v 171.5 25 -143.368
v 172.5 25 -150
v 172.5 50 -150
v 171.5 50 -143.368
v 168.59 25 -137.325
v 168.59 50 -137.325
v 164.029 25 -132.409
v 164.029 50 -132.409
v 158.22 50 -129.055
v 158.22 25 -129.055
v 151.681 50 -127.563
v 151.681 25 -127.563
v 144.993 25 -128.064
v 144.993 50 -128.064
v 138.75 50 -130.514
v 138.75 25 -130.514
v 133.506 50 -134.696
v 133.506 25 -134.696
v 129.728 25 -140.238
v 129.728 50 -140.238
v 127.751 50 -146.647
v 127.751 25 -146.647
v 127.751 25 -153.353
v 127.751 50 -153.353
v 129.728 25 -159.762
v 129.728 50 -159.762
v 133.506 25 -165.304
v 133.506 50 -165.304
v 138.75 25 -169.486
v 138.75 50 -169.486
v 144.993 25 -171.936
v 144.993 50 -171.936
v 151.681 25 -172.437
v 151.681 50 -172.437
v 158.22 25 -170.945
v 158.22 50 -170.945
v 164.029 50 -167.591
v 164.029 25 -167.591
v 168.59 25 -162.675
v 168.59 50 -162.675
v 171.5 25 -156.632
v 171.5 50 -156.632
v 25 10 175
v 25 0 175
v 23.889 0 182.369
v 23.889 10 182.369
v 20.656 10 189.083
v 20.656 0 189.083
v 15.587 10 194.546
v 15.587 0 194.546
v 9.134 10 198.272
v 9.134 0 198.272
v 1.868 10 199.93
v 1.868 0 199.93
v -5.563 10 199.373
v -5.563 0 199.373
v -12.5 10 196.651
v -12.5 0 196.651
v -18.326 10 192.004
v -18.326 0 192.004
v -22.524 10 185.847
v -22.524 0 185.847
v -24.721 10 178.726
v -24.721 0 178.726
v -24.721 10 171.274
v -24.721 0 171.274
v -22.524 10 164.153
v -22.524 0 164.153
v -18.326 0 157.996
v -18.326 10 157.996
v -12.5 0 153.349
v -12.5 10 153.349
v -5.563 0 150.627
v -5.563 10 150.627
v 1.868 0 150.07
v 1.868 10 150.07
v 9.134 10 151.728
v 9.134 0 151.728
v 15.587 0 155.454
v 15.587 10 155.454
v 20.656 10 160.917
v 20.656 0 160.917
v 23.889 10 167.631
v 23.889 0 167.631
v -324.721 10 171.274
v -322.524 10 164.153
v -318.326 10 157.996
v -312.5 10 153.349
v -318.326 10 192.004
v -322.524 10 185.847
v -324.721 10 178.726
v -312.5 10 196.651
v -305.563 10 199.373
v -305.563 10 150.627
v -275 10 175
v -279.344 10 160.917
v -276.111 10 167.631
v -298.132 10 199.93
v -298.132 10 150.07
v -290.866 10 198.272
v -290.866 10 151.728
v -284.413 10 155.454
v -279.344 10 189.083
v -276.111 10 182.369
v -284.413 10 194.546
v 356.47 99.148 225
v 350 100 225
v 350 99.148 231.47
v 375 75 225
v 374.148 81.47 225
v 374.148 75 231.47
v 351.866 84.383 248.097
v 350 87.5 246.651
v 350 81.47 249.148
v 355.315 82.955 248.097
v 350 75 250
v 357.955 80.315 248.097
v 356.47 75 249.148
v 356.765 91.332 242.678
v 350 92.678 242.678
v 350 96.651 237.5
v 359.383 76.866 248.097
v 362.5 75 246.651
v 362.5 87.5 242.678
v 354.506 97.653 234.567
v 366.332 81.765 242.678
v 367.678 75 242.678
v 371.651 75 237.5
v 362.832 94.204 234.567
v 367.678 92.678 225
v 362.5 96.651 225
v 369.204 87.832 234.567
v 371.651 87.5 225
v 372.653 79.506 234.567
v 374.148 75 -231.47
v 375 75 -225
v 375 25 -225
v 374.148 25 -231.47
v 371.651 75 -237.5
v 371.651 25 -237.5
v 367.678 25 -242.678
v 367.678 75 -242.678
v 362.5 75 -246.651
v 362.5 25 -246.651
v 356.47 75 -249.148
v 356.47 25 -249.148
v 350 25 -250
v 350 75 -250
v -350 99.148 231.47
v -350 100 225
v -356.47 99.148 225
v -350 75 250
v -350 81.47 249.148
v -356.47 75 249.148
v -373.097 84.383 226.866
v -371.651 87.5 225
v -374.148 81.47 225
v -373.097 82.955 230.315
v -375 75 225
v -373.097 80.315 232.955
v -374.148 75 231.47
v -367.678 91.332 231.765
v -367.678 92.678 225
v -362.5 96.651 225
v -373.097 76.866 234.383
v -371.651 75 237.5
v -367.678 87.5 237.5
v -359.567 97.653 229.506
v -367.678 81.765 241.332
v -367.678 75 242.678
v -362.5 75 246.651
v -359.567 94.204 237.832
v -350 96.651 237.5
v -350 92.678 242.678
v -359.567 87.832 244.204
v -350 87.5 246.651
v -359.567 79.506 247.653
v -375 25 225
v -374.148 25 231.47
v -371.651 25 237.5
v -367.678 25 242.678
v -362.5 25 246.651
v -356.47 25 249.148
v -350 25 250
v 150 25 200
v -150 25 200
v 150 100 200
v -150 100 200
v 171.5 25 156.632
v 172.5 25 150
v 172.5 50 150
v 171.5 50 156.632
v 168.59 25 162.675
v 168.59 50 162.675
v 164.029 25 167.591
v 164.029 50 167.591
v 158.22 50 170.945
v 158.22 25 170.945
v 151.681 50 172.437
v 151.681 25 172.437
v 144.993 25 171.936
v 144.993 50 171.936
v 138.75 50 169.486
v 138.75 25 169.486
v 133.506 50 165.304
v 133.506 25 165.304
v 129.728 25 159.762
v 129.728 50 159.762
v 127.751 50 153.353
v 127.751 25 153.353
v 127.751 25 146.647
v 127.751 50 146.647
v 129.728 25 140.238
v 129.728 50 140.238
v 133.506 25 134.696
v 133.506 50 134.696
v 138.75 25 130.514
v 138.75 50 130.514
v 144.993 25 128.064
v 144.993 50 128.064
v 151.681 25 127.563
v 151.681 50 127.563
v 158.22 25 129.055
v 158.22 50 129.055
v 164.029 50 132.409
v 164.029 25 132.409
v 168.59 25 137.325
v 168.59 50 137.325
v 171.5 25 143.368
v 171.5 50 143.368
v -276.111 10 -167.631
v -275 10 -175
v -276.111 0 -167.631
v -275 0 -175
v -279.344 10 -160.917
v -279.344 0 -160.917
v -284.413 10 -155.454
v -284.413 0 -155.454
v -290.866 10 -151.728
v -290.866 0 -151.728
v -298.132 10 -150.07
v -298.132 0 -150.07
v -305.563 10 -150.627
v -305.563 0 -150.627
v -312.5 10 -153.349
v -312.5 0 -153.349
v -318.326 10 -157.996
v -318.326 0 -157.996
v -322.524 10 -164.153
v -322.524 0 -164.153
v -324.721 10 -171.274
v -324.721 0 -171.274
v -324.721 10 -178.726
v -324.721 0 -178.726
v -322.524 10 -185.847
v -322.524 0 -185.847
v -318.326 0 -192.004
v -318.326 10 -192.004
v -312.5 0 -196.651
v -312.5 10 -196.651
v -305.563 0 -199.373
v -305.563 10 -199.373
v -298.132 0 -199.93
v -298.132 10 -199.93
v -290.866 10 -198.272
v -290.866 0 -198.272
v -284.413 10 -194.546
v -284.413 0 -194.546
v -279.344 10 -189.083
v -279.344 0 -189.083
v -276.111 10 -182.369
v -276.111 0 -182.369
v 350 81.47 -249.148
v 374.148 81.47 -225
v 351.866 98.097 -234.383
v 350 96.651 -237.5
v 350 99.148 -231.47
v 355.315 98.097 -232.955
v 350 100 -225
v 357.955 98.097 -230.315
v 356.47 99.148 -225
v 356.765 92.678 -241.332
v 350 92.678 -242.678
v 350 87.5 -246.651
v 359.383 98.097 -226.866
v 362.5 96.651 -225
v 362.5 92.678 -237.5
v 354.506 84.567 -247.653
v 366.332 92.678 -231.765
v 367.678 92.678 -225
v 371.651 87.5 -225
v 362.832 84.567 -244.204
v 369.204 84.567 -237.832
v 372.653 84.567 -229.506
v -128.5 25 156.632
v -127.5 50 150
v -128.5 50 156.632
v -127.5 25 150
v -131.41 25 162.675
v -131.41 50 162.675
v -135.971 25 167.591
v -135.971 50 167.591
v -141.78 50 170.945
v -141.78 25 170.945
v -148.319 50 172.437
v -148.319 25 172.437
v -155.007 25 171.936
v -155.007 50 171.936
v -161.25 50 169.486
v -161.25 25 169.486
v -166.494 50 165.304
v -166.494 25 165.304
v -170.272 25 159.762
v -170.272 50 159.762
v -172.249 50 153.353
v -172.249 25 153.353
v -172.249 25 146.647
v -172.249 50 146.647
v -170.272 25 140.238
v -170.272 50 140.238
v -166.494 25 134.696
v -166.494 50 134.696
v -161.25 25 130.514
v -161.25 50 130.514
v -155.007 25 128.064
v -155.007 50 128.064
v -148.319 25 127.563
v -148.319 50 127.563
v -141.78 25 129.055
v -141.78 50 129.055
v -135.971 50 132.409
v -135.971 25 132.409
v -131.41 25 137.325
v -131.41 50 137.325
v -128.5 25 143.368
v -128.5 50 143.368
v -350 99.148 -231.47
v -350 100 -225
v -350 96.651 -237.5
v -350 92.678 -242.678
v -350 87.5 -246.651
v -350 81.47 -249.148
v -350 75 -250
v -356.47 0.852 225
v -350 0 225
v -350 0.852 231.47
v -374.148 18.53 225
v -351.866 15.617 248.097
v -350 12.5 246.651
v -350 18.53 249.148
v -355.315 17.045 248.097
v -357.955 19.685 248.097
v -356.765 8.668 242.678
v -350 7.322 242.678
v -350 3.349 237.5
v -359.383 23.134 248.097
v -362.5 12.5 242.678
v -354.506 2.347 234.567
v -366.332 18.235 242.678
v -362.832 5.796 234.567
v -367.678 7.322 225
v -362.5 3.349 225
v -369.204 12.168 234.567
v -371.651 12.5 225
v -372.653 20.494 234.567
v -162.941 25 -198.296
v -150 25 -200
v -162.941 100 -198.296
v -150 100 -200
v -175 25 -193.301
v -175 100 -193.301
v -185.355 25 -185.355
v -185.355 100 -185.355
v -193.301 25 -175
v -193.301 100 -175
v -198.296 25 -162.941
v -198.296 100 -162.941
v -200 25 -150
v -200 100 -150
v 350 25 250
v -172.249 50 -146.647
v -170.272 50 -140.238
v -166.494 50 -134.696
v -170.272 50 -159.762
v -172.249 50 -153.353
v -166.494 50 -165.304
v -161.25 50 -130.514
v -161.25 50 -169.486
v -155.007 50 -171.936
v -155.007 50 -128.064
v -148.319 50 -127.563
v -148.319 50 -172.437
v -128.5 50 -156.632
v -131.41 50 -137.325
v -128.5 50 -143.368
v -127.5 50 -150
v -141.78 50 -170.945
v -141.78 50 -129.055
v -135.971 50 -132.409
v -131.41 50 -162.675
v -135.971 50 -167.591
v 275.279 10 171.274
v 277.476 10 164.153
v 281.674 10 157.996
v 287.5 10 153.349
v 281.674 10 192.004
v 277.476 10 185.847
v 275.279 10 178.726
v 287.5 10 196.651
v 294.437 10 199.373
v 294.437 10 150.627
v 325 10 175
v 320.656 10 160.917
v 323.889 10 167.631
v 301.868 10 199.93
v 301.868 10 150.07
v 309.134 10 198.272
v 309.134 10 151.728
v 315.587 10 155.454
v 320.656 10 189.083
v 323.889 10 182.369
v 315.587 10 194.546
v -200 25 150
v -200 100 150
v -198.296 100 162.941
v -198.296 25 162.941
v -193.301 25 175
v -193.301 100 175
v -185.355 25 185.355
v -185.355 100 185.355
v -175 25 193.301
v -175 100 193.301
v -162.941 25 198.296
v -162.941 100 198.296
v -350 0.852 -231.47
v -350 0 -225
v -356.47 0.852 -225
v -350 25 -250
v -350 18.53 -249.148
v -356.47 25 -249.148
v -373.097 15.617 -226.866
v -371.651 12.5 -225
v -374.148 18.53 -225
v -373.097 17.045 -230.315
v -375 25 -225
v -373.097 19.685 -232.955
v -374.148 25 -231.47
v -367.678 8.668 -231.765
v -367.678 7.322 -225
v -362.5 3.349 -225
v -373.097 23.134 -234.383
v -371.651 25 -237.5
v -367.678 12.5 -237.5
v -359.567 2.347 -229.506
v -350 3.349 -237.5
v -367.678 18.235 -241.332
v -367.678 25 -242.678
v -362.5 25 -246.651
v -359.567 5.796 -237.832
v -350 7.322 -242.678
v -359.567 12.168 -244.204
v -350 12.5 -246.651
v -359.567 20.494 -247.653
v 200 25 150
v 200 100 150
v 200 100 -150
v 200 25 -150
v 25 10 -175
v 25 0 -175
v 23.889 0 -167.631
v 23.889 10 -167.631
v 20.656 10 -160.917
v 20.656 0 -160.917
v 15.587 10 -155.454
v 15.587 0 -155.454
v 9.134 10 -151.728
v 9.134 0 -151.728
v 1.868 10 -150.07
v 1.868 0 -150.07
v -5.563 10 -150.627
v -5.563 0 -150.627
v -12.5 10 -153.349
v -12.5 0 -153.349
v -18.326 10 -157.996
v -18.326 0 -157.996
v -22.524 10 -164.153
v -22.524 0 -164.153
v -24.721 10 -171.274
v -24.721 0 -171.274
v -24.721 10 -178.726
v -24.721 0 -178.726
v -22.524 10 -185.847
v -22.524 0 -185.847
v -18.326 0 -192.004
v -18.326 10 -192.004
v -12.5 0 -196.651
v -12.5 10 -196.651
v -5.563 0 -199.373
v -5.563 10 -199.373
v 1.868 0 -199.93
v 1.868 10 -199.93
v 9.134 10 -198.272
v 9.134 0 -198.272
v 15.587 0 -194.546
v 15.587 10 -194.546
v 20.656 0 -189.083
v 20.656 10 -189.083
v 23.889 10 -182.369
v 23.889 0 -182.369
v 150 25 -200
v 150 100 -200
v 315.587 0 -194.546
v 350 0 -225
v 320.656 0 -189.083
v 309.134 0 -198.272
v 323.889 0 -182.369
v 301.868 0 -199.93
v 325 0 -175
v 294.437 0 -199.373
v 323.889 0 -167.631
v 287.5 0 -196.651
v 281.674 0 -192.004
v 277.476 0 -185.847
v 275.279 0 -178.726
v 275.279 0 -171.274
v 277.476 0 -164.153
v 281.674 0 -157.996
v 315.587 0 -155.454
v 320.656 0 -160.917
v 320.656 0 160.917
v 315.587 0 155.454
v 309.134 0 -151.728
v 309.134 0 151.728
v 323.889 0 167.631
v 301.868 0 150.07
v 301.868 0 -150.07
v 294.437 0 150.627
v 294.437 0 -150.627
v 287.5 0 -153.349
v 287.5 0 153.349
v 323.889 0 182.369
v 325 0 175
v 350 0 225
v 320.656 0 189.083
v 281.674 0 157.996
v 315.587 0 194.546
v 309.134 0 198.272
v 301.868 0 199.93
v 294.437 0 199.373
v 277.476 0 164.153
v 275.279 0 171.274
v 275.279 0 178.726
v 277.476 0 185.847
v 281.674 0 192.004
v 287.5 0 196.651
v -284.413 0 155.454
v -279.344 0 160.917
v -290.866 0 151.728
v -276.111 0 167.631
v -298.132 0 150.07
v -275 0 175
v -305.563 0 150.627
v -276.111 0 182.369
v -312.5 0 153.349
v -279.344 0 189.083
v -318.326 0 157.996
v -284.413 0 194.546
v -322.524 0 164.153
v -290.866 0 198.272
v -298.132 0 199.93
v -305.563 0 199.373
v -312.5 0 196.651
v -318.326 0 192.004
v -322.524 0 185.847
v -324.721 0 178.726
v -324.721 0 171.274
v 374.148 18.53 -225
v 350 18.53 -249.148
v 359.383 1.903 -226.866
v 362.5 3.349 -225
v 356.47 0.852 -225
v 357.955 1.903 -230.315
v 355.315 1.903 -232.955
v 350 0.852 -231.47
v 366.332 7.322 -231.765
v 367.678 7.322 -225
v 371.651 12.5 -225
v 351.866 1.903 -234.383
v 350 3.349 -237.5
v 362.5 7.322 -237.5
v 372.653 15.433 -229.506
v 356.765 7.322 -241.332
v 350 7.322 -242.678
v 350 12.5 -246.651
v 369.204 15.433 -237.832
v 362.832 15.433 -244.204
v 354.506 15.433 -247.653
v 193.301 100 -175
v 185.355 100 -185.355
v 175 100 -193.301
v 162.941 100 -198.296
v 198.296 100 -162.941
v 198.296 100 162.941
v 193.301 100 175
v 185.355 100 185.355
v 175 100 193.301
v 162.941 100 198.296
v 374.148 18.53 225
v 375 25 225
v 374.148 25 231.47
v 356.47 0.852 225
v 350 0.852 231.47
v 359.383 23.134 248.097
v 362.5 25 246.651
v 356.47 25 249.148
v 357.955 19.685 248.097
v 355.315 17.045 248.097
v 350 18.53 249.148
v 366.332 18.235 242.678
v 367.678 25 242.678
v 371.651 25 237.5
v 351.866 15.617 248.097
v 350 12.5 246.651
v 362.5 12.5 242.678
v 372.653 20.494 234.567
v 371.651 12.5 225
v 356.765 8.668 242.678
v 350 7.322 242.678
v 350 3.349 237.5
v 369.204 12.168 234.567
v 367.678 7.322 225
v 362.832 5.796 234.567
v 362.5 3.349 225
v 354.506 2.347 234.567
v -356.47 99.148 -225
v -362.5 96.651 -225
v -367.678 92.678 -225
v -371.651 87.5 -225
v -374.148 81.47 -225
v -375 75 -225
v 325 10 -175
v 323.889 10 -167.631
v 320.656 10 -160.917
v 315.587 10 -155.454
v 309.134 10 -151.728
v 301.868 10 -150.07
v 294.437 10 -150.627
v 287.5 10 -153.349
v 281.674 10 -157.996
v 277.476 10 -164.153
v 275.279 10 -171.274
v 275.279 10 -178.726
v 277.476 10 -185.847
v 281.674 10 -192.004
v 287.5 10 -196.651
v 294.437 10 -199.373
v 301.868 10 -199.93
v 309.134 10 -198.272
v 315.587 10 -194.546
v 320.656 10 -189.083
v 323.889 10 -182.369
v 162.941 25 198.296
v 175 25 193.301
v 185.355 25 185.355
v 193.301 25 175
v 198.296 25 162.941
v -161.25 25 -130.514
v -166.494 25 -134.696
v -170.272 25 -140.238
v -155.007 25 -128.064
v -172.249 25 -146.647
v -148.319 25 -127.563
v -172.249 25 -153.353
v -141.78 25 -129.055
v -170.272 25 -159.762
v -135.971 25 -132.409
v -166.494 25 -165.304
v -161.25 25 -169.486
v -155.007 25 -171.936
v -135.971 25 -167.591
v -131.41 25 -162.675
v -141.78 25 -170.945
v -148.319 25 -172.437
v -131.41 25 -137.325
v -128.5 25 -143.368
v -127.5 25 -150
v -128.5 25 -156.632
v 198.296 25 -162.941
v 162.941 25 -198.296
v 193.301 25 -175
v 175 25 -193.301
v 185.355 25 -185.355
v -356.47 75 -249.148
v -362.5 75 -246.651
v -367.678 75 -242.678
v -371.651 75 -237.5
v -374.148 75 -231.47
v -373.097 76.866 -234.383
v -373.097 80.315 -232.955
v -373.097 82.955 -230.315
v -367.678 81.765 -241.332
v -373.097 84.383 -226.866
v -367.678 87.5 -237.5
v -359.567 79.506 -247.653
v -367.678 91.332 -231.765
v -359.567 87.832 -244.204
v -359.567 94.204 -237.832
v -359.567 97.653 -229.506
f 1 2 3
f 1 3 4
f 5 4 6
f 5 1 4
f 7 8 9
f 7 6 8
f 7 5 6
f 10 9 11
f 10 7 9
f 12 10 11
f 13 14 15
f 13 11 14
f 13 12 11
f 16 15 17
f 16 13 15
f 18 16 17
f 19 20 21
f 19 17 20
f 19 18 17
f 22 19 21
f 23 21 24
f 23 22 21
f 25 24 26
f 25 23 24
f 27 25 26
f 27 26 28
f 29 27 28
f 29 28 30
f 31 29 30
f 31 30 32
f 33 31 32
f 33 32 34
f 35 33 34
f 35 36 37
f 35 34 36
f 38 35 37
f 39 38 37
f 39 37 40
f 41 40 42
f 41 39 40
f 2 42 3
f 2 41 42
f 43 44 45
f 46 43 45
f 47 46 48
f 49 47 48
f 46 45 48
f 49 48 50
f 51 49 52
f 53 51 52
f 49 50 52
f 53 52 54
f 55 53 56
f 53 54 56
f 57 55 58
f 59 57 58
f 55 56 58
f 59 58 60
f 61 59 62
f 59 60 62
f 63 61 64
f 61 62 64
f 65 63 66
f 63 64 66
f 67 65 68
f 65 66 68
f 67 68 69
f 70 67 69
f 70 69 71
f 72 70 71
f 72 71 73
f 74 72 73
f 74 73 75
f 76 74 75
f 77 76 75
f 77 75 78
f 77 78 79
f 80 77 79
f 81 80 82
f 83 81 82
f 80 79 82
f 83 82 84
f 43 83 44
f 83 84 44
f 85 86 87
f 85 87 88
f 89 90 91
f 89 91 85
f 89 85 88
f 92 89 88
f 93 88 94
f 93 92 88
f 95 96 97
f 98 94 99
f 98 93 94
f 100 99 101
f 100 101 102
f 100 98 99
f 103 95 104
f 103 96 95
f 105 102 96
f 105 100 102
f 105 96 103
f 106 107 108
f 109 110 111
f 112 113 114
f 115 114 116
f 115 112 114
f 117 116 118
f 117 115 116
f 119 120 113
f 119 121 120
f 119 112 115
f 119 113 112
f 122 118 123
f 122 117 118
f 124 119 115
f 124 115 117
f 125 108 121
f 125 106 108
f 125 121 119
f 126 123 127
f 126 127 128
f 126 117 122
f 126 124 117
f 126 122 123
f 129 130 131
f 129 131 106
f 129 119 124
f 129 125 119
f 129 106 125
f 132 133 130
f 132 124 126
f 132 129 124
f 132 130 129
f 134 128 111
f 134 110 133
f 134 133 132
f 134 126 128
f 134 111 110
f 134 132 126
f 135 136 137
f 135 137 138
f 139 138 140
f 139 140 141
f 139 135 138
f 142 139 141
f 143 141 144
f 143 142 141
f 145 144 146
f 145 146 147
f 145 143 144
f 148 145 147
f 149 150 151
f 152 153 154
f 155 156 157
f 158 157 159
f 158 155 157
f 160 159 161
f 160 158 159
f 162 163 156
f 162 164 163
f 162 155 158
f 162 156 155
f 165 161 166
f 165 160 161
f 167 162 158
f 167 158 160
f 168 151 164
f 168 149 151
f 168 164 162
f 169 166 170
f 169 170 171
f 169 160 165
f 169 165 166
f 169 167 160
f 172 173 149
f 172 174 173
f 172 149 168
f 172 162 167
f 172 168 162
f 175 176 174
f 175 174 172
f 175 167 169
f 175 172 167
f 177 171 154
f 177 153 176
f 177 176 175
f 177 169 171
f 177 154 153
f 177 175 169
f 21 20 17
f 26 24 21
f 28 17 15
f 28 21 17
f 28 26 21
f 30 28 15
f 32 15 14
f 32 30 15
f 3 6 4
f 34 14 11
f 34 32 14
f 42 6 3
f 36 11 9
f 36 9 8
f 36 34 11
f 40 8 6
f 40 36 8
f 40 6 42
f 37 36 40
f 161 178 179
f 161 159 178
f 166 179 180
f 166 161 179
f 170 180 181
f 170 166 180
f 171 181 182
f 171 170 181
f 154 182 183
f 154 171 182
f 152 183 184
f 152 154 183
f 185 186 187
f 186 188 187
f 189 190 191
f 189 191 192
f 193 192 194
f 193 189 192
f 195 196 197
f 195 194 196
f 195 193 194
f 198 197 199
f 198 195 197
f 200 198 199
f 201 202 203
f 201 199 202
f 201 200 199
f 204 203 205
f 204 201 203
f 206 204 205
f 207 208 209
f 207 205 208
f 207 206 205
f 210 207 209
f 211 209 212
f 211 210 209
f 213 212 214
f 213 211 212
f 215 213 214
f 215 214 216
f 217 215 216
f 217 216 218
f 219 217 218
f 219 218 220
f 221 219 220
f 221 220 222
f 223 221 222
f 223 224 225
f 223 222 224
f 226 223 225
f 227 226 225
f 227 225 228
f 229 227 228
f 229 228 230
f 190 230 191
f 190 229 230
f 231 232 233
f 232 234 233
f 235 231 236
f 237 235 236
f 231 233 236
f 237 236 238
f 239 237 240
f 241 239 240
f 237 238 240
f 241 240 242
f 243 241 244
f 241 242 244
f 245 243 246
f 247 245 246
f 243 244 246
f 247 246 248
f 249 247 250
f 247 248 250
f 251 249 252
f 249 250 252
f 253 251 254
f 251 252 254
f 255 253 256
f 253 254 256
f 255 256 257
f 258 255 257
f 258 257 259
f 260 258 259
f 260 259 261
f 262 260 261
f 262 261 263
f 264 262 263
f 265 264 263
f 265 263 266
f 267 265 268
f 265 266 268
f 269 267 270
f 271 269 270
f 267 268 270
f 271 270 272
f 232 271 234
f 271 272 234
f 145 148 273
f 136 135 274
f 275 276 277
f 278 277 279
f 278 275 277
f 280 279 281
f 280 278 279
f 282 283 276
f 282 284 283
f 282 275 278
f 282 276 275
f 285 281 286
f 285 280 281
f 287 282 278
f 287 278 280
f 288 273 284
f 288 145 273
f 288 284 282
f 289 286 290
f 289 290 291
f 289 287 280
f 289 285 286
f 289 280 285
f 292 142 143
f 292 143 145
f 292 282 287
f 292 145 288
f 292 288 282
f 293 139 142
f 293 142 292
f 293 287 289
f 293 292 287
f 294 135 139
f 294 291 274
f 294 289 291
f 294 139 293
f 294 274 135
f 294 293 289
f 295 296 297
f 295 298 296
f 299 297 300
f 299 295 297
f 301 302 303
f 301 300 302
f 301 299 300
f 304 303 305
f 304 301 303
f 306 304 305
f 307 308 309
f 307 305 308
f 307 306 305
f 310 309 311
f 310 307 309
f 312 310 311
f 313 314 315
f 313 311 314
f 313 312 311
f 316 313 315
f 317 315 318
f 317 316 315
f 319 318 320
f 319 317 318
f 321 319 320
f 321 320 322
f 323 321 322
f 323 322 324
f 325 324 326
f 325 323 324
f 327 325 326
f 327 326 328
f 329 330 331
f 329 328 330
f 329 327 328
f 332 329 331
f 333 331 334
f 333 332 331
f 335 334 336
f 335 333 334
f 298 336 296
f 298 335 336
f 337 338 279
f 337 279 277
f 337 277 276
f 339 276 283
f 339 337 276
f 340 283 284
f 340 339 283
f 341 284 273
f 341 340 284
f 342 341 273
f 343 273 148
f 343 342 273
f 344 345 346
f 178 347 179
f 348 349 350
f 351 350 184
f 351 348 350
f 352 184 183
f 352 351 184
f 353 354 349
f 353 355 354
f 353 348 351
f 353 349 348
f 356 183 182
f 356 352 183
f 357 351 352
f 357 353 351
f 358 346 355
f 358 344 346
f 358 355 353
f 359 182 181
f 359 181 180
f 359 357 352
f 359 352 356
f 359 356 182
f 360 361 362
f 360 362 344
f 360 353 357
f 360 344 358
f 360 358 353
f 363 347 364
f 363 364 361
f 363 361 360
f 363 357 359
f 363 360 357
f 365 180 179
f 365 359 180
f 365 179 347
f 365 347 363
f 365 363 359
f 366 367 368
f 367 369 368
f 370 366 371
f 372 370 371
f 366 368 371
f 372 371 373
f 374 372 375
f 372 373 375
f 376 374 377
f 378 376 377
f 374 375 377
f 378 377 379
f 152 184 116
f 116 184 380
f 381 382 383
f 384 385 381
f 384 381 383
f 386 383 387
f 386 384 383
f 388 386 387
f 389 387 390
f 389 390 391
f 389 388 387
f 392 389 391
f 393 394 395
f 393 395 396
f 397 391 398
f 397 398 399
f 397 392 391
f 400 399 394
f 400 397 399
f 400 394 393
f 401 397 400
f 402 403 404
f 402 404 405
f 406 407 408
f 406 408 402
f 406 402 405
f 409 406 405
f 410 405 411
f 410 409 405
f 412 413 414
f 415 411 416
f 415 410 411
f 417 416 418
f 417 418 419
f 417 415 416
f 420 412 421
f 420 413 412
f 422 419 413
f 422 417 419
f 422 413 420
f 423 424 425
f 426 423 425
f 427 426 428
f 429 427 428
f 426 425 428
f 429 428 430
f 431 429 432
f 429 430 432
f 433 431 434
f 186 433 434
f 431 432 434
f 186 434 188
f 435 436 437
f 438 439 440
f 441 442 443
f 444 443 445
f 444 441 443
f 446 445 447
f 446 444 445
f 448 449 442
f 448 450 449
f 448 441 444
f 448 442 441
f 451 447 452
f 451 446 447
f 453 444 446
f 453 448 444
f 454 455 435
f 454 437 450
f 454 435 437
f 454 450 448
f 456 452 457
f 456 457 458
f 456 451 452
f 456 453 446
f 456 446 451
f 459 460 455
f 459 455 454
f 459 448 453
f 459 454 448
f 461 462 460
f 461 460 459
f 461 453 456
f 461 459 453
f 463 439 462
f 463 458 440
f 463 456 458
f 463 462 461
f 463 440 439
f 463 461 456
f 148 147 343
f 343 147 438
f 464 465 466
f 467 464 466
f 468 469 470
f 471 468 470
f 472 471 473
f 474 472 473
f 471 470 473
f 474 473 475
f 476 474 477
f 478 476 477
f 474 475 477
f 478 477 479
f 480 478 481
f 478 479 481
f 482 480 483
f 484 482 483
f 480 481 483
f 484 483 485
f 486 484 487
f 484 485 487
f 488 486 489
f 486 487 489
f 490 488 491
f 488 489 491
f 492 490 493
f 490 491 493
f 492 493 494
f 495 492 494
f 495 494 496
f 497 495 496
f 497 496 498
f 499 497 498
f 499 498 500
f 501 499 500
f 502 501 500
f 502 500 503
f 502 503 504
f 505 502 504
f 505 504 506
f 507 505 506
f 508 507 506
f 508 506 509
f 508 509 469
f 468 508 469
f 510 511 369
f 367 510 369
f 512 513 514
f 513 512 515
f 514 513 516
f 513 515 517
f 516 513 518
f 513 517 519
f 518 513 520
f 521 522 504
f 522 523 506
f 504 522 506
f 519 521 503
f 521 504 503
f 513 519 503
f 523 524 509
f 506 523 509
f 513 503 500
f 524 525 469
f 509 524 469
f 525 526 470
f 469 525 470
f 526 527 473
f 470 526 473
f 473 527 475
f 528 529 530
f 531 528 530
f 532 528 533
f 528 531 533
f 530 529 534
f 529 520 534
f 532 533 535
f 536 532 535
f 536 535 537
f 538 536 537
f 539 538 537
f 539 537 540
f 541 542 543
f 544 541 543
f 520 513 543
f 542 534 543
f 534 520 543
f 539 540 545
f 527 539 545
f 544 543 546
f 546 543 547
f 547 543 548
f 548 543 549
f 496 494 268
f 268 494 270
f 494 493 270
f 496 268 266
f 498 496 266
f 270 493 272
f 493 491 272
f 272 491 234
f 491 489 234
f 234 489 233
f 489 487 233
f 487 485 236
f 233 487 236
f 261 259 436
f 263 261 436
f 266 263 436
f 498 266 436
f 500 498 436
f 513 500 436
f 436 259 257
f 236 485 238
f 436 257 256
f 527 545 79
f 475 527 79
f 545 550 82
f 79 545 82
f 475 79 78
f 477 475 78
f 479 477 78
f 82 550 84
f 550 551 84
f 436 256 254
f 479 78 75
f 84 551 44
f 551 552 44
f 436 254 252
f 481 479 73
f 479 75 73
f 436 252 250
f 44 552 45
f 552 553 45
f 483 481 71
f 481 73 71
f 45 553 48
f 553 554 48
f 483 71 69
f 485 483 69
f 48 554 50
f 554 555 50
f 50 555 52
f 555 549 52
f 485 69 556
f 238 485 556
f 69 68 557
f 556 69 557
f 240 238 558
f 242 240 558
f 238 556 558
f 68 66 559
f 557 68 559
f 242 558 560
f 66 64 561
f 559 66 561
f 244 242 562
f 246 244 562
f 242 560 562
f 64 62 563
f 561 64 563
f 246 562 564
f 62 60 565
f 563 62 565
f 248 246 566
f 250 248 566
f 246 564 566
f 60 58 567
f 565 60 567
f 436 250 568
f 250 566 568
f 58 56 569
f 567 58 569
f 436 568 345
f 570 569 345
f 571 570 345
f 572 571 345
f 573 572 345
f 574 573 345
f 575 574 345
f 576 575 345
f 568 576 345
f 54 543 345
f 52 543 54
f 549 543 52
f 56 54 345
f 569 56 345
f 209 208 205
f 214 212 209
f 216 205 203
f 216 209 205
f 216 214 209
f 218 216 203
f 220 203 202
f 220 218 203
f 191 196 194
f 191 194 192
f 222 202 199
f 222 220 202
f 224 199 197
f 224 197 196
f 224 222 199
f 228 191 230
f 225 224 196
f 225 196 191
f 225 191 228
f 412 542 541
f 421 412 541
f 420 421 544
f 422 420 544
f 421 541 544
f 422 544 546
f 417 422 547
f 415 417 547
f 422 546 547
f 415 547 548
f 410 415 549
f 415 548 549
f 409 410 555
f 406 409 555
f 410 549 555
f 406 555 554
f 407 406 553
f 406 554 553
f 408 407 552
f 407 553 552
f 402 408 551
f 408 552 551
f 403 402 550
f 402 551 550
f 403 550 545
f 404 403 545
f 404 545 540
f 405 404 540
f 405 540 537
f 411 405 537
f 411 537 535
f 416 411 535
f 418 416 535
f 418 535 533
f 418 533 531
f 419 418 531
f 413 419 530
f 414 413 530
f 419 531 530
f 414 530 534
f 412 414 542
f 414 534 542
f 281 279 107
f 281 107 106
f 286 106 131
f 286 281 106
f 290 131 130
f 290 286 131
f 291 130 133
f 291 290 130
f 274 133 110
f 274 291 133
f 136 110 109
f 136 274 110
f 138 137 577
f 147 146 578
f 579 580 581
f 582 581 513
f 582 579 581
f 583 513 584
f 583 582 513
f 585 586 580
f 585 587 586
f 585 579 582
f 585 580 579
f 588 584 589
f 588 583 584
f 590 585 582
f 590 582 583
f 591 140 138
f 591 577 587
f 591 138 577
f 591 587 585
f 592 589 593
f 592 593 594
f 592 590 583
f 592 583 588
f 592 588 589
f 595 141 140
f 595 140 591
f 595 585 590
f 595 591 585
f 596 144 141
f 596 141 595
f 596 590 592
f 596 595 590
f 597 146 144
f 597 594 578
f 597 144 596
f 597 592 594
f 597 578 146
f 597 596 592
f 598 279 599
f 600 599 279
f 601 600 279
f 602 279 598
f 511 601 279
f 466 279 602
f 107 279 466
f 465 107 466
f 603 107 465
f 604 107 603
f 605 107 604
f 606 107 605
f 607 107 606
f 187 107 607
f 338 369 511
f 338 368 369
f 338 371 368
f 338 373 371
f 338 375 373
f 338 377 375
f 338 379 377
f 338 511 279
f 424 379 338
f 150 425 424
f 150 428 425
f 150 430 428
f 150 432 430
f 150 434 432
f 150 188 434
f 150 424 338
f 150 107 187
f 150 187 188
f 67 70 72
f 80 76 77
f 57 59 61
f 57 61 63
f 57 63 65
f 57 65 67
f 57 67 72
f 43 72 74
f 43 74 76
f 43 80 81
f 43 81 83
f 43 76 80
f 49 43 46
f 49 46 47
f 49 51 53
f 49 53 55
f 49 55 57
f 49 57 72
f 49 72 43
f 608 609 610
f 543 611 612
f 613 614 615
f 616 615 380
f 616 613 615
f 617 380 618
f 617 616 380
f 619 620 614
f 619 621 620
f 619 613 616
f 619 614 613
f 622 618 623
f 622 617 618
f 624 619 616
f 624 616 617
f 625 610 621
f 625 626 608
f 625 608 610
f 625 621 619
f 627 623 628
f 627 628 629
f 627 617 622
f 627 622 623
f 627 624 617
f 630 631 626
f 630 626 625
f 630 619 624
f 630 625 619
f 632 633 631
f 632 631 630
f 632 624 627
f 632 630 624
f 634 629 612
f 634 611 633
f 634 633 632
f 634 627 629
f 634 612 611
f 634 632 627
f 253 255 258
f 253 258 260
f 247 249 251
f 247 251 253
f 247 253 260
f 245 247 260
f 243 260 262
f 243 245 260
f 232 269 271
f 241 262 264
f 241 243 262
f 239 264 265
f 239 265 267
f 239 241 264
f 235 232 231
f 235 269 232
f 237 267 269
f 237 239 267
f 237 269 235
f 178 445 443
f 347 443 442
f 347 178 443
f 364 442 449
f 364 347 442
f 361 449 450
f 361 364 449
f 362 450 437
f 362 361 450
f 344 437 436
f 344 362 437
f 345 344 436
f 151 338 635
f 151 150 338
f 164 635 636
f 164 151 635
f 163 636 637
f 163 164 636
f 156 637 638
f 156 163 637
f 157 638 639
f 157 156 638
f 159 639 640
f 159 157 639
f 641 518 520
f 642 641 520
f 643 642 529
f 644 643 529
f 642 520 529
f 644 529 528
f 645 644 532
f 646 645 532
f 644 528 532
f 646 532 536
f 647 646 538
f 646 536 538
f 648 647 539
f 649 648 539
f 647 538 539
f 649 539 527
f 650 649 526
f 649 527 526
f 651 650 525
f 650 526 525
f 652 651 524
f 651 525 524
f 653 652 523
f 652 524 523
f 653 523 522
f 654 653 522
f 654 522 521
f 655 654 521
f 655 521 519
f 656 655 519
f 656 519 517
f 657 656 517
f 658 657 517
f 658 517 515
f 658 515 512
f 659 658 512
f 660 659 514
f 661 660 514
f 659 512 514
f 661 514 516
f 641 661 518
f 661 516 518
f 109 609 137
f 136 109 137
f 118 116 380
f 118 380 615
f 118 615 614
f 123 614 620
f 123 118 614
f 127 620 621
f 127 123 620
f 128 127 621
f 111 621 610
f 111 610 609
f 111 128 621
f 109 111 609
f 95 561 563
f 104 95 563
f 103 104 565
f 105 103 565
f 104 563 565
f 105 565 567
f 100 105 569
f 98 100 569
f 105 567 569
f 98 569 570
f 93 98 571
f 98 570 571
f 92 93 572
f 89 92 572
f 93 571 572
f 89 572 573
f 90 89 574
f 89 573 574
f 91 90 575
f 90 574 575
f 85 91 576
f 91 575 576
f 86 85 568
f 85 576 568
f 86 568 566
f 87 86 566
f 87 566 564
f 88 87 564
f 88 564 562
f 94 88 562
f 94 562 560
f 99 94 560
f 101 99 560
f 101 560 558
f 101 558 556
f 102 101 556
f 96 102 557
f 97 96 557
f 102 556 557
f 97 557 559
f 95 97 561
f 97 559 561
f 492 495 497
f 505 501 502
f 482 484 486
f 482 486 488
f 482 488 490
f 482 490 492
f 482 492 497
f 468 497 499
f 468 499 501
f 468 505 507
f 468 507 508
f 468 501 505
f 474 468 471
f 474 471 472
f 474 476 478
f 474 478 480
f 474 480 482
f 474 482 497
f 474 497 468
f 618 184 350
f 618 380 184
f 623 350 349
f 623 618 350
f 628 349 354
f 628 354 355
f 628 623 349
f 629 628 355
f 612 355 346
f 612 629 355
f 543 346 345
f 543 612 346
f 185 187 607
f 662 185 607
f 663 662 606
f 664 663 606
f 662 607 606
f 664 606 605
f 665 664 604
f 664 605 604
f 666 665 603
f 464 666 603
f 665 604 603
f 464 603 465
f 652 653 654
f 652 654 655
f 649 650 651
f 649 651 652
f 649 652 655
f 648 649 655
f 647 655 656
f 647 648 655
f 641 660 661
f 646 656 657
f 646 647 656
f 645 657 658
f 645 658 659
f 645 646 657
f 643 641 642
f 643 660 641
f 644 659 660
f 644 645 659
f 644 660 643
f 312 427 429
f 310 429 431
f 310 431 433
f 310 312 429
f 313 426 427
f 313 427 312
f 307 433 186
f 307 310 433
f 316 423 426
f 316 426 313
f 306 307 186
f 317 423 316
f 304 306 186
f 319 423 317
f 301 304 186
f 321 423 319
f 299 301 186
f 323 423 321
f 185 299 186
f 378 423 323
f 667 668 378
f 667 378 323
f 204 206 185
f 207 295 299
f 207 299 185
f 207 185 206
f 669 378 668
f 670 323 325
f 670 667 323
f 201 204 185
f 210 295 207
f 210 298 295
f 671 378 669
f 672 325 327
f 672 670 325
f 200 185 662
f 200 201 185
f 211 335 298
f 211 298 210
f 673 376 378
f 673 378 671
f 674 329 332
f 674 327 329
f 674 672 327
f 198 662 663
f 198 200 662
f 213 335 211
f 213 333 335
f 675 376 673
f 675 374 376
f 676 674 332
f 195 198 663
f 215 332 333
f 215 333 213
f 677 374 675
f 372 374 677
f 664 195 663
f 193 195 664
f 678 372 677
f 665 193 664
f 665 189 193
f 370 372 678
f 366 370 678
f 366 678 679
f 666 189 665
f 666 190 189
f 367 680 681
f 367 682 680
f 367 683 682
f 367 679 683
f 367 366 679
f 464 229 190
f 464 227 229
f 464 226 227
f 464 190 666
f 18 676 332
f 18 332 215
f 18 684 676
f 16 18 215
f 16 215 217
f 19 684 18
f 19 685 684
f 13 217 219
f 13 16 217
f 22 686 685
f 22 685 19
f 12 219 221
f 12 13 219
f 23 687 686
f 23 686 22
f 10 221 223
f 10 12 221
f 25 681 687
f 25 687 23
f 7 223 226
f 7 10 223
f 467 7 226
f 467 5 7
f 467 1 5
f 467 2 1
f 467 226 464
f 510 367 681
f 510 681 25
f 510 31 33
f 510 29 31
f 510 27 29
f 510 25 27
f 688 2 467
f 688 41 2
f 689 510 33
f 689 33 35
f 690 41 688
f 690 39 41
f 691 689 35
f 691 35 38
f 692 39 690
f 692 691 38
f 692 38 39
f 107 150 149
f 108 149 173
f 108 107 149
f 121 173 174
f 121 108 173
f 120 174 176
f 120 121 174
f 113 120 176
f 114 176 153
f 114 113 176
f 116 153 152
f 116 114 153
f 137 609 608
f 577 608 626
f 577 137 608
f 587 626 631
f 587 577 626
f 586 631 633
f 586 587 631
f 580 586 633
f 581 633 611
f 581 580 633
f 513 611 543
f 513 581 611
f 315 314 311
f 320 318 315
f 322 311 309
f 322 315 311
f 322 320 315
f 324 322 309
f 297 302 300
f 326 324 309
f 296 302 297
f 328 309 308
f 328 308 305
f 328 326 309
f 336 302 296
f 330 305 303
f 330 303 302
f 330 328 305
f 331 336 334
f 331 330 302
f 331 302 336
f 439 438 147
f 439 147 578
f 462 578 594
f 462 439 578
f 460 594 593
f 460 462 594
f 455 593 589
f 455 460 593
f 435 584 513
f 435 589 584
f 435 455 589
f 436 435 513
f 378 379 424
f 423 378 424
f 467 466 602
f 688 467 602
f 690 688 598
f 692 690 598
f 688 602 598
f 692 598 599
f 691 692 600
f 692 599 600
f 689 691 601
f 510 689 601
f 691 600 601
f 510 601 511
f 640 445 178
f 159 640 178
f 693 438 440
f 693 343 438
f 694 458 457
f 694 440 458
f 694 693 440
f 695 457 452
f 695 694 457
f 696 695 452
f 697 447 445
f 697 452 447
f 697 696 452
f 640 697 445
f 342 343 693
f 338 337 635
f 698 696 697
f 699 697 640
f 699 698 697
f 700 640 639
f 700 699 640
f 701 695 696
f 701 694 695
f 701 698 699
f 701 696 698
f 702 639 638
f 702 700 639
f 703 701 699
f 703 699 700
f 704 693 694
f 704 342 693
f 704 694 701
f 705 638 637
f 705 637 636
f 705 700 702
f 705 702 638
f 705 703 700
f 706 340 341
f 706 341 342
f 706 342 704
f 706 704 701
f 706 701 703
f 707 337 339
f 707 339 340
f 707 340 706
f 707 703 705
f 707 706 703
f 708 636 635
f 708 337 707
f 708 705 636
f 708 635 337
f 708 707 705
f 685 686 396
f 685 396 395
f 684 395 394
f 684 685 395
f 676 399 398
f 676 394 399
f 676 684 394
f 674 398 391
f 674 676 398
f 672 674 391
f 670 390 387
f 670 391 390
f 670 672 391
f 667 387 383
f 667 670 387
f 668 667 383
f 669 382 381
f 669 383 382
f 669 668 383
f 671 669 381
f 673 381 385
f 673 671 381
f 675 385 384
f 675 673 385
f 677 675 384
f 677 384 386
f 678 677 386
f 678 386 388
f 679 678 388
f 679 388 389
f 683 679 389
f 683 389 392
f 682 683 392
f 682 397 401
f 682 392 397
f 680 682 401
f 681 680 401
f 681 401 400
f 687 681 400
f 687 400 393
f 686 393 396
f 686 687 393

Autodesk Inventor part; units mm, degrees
ref_plane "YZ Plane" through (0, 0, 0) normal (1, 0, 0) x (0, 1, 0)
ref_plane "XZ Plane" through (0, 0, 0) normal (0, 1, 0) x (-1, 0, 0)
ref_plane "XY Plane" through (0, 0, 0) normal (0, 0, 1) x (1, 0, 0)
sketch "Sketch1" plane through (0, 0, 0) normal (0, 1, 0) x (-1, 0, 0)
  line L0 (375, 250) -> (-375, 250)
  line L1 (-375, 250) -> (-375, -250)
  line L2 (-375, -250) -> (375, -250)
  line L3 (375, -250) -> (375, 250)
  line L4 (375, 250) -> (-375, -250) construction
  line L5 (-375, 250) -> (375, -250) construction
  point P0 (0, 0)
  dimension "d0" = 750
  dimension "d1" = 500
extrude "Extrusion1" add sketch "Sketch1" along normal blind 100
sketch "Sketch2" plane through (0, 100, 0) normal (0, 1, 0) x (1, 0, 0)
  line L0 (-150, -200) -> (150, -200)
  line L1 (200, -150) -> (200, 150)
  line L2 (150, 200) -> (-150, 200)
  line L3 (-200, 150) -> (-200, -150)
  line L4 (-200, -200) -> (200, 200) construction
  line L5 (200, -200) -> (-200, 200) construction
  arc A0 (-200, -150) -> (-150, -200) centre (-150, -150) ccw
  arc A1 (-150, 200) -> (-200, 150) centre (-150, 150) ccw
  arc A2 (150, -200) -> (200, -150) centre (150, -150) ccw
  arc A3 (200, 150) -> (150, 200) centre (150, 150) ccw
  point P0 (0, 0)
  dimension "d4" = 400
  dimension "d5" = 400
  dimension "d6" = 50
  dimension "d7" = 50
  dimension "d8" = 50
extrude "Extrusion2" cut sketch "Sketch2" against normal blind 75
fillet "Fillet1" radius 25 12 edges at (375, 50, -250) (375, 0, 0) (375, 100, 0) (375, 50, 250) (0, 100, 250) (0, 100, -250) (-375, 100, 0) (0, 0, -250) (-375, 50, -250) (-375, 0, 0) (-375, 50, 250) (0, 0, 250)
sketch "Sketch3" plane through (0, 0, 0) normal (0, -1, 0) x (1, 0, 0)
  line L0 (300, -175) -> (-300, 175) construction
  line L1 (-300, -175) -> (300, 175) construction
  circle A0 centre (-300, -175) radius 25
  circle A1 centre (-300, 175) radius 25
  circle A2 centre (0, -175) radius 25
  circle A3 centre (0, 175) radius 25
  circle A4 centre (300, -175) radius 25
  circle A5 centre (300, 175) radius 25
  point P0 (0, 0)
  dimension "d12" = 600
  dimension "d13" = 350
  dimension "d14" = 50
  dimension "d15" = 50
  dimension "d16" = 50
  dimension "d17" = 50
  dimension "d18" = 50
  dimension "d19" = 50
extrude "Extrusion3" cut sketch "Sketch3" against normal blind 10
sketch "Sketch4" plane through (0, 25, 0) normal (0, 1, 0) x (1, 0, 0)
  circle A0 centre (-150, 150) radius 22.5
  arc A1 (-150, 200) -> (-200, 150) centre (-150, 150) ccw projected
  circle A2 centre (150, 150) radius 22.5
  circle A3 centre (150, -150) radius 22.5
  circle A4 centre (-150, -150) radius 22.5
  arc A5 (200, 150) -> (150, 200) centre (150, 150) ccw projected
  arc A6 (150, -200) -> (200, -150) centre (150, -150) ccw projected
  arc A7 (-200, -150) -> (-150, -200) centre (-150, -150) ccw projected
  point P0 (0, 0)
  dimension "d22" = 45
  dimension "d23" = 45
  dimension "d24" = 45
  dimension "d25" = 45
extrude "Extrusion4" add sketch "Sketch4" along normal blind 25
properties part number "WHEEL_BASE" material "Stainless Steel"
